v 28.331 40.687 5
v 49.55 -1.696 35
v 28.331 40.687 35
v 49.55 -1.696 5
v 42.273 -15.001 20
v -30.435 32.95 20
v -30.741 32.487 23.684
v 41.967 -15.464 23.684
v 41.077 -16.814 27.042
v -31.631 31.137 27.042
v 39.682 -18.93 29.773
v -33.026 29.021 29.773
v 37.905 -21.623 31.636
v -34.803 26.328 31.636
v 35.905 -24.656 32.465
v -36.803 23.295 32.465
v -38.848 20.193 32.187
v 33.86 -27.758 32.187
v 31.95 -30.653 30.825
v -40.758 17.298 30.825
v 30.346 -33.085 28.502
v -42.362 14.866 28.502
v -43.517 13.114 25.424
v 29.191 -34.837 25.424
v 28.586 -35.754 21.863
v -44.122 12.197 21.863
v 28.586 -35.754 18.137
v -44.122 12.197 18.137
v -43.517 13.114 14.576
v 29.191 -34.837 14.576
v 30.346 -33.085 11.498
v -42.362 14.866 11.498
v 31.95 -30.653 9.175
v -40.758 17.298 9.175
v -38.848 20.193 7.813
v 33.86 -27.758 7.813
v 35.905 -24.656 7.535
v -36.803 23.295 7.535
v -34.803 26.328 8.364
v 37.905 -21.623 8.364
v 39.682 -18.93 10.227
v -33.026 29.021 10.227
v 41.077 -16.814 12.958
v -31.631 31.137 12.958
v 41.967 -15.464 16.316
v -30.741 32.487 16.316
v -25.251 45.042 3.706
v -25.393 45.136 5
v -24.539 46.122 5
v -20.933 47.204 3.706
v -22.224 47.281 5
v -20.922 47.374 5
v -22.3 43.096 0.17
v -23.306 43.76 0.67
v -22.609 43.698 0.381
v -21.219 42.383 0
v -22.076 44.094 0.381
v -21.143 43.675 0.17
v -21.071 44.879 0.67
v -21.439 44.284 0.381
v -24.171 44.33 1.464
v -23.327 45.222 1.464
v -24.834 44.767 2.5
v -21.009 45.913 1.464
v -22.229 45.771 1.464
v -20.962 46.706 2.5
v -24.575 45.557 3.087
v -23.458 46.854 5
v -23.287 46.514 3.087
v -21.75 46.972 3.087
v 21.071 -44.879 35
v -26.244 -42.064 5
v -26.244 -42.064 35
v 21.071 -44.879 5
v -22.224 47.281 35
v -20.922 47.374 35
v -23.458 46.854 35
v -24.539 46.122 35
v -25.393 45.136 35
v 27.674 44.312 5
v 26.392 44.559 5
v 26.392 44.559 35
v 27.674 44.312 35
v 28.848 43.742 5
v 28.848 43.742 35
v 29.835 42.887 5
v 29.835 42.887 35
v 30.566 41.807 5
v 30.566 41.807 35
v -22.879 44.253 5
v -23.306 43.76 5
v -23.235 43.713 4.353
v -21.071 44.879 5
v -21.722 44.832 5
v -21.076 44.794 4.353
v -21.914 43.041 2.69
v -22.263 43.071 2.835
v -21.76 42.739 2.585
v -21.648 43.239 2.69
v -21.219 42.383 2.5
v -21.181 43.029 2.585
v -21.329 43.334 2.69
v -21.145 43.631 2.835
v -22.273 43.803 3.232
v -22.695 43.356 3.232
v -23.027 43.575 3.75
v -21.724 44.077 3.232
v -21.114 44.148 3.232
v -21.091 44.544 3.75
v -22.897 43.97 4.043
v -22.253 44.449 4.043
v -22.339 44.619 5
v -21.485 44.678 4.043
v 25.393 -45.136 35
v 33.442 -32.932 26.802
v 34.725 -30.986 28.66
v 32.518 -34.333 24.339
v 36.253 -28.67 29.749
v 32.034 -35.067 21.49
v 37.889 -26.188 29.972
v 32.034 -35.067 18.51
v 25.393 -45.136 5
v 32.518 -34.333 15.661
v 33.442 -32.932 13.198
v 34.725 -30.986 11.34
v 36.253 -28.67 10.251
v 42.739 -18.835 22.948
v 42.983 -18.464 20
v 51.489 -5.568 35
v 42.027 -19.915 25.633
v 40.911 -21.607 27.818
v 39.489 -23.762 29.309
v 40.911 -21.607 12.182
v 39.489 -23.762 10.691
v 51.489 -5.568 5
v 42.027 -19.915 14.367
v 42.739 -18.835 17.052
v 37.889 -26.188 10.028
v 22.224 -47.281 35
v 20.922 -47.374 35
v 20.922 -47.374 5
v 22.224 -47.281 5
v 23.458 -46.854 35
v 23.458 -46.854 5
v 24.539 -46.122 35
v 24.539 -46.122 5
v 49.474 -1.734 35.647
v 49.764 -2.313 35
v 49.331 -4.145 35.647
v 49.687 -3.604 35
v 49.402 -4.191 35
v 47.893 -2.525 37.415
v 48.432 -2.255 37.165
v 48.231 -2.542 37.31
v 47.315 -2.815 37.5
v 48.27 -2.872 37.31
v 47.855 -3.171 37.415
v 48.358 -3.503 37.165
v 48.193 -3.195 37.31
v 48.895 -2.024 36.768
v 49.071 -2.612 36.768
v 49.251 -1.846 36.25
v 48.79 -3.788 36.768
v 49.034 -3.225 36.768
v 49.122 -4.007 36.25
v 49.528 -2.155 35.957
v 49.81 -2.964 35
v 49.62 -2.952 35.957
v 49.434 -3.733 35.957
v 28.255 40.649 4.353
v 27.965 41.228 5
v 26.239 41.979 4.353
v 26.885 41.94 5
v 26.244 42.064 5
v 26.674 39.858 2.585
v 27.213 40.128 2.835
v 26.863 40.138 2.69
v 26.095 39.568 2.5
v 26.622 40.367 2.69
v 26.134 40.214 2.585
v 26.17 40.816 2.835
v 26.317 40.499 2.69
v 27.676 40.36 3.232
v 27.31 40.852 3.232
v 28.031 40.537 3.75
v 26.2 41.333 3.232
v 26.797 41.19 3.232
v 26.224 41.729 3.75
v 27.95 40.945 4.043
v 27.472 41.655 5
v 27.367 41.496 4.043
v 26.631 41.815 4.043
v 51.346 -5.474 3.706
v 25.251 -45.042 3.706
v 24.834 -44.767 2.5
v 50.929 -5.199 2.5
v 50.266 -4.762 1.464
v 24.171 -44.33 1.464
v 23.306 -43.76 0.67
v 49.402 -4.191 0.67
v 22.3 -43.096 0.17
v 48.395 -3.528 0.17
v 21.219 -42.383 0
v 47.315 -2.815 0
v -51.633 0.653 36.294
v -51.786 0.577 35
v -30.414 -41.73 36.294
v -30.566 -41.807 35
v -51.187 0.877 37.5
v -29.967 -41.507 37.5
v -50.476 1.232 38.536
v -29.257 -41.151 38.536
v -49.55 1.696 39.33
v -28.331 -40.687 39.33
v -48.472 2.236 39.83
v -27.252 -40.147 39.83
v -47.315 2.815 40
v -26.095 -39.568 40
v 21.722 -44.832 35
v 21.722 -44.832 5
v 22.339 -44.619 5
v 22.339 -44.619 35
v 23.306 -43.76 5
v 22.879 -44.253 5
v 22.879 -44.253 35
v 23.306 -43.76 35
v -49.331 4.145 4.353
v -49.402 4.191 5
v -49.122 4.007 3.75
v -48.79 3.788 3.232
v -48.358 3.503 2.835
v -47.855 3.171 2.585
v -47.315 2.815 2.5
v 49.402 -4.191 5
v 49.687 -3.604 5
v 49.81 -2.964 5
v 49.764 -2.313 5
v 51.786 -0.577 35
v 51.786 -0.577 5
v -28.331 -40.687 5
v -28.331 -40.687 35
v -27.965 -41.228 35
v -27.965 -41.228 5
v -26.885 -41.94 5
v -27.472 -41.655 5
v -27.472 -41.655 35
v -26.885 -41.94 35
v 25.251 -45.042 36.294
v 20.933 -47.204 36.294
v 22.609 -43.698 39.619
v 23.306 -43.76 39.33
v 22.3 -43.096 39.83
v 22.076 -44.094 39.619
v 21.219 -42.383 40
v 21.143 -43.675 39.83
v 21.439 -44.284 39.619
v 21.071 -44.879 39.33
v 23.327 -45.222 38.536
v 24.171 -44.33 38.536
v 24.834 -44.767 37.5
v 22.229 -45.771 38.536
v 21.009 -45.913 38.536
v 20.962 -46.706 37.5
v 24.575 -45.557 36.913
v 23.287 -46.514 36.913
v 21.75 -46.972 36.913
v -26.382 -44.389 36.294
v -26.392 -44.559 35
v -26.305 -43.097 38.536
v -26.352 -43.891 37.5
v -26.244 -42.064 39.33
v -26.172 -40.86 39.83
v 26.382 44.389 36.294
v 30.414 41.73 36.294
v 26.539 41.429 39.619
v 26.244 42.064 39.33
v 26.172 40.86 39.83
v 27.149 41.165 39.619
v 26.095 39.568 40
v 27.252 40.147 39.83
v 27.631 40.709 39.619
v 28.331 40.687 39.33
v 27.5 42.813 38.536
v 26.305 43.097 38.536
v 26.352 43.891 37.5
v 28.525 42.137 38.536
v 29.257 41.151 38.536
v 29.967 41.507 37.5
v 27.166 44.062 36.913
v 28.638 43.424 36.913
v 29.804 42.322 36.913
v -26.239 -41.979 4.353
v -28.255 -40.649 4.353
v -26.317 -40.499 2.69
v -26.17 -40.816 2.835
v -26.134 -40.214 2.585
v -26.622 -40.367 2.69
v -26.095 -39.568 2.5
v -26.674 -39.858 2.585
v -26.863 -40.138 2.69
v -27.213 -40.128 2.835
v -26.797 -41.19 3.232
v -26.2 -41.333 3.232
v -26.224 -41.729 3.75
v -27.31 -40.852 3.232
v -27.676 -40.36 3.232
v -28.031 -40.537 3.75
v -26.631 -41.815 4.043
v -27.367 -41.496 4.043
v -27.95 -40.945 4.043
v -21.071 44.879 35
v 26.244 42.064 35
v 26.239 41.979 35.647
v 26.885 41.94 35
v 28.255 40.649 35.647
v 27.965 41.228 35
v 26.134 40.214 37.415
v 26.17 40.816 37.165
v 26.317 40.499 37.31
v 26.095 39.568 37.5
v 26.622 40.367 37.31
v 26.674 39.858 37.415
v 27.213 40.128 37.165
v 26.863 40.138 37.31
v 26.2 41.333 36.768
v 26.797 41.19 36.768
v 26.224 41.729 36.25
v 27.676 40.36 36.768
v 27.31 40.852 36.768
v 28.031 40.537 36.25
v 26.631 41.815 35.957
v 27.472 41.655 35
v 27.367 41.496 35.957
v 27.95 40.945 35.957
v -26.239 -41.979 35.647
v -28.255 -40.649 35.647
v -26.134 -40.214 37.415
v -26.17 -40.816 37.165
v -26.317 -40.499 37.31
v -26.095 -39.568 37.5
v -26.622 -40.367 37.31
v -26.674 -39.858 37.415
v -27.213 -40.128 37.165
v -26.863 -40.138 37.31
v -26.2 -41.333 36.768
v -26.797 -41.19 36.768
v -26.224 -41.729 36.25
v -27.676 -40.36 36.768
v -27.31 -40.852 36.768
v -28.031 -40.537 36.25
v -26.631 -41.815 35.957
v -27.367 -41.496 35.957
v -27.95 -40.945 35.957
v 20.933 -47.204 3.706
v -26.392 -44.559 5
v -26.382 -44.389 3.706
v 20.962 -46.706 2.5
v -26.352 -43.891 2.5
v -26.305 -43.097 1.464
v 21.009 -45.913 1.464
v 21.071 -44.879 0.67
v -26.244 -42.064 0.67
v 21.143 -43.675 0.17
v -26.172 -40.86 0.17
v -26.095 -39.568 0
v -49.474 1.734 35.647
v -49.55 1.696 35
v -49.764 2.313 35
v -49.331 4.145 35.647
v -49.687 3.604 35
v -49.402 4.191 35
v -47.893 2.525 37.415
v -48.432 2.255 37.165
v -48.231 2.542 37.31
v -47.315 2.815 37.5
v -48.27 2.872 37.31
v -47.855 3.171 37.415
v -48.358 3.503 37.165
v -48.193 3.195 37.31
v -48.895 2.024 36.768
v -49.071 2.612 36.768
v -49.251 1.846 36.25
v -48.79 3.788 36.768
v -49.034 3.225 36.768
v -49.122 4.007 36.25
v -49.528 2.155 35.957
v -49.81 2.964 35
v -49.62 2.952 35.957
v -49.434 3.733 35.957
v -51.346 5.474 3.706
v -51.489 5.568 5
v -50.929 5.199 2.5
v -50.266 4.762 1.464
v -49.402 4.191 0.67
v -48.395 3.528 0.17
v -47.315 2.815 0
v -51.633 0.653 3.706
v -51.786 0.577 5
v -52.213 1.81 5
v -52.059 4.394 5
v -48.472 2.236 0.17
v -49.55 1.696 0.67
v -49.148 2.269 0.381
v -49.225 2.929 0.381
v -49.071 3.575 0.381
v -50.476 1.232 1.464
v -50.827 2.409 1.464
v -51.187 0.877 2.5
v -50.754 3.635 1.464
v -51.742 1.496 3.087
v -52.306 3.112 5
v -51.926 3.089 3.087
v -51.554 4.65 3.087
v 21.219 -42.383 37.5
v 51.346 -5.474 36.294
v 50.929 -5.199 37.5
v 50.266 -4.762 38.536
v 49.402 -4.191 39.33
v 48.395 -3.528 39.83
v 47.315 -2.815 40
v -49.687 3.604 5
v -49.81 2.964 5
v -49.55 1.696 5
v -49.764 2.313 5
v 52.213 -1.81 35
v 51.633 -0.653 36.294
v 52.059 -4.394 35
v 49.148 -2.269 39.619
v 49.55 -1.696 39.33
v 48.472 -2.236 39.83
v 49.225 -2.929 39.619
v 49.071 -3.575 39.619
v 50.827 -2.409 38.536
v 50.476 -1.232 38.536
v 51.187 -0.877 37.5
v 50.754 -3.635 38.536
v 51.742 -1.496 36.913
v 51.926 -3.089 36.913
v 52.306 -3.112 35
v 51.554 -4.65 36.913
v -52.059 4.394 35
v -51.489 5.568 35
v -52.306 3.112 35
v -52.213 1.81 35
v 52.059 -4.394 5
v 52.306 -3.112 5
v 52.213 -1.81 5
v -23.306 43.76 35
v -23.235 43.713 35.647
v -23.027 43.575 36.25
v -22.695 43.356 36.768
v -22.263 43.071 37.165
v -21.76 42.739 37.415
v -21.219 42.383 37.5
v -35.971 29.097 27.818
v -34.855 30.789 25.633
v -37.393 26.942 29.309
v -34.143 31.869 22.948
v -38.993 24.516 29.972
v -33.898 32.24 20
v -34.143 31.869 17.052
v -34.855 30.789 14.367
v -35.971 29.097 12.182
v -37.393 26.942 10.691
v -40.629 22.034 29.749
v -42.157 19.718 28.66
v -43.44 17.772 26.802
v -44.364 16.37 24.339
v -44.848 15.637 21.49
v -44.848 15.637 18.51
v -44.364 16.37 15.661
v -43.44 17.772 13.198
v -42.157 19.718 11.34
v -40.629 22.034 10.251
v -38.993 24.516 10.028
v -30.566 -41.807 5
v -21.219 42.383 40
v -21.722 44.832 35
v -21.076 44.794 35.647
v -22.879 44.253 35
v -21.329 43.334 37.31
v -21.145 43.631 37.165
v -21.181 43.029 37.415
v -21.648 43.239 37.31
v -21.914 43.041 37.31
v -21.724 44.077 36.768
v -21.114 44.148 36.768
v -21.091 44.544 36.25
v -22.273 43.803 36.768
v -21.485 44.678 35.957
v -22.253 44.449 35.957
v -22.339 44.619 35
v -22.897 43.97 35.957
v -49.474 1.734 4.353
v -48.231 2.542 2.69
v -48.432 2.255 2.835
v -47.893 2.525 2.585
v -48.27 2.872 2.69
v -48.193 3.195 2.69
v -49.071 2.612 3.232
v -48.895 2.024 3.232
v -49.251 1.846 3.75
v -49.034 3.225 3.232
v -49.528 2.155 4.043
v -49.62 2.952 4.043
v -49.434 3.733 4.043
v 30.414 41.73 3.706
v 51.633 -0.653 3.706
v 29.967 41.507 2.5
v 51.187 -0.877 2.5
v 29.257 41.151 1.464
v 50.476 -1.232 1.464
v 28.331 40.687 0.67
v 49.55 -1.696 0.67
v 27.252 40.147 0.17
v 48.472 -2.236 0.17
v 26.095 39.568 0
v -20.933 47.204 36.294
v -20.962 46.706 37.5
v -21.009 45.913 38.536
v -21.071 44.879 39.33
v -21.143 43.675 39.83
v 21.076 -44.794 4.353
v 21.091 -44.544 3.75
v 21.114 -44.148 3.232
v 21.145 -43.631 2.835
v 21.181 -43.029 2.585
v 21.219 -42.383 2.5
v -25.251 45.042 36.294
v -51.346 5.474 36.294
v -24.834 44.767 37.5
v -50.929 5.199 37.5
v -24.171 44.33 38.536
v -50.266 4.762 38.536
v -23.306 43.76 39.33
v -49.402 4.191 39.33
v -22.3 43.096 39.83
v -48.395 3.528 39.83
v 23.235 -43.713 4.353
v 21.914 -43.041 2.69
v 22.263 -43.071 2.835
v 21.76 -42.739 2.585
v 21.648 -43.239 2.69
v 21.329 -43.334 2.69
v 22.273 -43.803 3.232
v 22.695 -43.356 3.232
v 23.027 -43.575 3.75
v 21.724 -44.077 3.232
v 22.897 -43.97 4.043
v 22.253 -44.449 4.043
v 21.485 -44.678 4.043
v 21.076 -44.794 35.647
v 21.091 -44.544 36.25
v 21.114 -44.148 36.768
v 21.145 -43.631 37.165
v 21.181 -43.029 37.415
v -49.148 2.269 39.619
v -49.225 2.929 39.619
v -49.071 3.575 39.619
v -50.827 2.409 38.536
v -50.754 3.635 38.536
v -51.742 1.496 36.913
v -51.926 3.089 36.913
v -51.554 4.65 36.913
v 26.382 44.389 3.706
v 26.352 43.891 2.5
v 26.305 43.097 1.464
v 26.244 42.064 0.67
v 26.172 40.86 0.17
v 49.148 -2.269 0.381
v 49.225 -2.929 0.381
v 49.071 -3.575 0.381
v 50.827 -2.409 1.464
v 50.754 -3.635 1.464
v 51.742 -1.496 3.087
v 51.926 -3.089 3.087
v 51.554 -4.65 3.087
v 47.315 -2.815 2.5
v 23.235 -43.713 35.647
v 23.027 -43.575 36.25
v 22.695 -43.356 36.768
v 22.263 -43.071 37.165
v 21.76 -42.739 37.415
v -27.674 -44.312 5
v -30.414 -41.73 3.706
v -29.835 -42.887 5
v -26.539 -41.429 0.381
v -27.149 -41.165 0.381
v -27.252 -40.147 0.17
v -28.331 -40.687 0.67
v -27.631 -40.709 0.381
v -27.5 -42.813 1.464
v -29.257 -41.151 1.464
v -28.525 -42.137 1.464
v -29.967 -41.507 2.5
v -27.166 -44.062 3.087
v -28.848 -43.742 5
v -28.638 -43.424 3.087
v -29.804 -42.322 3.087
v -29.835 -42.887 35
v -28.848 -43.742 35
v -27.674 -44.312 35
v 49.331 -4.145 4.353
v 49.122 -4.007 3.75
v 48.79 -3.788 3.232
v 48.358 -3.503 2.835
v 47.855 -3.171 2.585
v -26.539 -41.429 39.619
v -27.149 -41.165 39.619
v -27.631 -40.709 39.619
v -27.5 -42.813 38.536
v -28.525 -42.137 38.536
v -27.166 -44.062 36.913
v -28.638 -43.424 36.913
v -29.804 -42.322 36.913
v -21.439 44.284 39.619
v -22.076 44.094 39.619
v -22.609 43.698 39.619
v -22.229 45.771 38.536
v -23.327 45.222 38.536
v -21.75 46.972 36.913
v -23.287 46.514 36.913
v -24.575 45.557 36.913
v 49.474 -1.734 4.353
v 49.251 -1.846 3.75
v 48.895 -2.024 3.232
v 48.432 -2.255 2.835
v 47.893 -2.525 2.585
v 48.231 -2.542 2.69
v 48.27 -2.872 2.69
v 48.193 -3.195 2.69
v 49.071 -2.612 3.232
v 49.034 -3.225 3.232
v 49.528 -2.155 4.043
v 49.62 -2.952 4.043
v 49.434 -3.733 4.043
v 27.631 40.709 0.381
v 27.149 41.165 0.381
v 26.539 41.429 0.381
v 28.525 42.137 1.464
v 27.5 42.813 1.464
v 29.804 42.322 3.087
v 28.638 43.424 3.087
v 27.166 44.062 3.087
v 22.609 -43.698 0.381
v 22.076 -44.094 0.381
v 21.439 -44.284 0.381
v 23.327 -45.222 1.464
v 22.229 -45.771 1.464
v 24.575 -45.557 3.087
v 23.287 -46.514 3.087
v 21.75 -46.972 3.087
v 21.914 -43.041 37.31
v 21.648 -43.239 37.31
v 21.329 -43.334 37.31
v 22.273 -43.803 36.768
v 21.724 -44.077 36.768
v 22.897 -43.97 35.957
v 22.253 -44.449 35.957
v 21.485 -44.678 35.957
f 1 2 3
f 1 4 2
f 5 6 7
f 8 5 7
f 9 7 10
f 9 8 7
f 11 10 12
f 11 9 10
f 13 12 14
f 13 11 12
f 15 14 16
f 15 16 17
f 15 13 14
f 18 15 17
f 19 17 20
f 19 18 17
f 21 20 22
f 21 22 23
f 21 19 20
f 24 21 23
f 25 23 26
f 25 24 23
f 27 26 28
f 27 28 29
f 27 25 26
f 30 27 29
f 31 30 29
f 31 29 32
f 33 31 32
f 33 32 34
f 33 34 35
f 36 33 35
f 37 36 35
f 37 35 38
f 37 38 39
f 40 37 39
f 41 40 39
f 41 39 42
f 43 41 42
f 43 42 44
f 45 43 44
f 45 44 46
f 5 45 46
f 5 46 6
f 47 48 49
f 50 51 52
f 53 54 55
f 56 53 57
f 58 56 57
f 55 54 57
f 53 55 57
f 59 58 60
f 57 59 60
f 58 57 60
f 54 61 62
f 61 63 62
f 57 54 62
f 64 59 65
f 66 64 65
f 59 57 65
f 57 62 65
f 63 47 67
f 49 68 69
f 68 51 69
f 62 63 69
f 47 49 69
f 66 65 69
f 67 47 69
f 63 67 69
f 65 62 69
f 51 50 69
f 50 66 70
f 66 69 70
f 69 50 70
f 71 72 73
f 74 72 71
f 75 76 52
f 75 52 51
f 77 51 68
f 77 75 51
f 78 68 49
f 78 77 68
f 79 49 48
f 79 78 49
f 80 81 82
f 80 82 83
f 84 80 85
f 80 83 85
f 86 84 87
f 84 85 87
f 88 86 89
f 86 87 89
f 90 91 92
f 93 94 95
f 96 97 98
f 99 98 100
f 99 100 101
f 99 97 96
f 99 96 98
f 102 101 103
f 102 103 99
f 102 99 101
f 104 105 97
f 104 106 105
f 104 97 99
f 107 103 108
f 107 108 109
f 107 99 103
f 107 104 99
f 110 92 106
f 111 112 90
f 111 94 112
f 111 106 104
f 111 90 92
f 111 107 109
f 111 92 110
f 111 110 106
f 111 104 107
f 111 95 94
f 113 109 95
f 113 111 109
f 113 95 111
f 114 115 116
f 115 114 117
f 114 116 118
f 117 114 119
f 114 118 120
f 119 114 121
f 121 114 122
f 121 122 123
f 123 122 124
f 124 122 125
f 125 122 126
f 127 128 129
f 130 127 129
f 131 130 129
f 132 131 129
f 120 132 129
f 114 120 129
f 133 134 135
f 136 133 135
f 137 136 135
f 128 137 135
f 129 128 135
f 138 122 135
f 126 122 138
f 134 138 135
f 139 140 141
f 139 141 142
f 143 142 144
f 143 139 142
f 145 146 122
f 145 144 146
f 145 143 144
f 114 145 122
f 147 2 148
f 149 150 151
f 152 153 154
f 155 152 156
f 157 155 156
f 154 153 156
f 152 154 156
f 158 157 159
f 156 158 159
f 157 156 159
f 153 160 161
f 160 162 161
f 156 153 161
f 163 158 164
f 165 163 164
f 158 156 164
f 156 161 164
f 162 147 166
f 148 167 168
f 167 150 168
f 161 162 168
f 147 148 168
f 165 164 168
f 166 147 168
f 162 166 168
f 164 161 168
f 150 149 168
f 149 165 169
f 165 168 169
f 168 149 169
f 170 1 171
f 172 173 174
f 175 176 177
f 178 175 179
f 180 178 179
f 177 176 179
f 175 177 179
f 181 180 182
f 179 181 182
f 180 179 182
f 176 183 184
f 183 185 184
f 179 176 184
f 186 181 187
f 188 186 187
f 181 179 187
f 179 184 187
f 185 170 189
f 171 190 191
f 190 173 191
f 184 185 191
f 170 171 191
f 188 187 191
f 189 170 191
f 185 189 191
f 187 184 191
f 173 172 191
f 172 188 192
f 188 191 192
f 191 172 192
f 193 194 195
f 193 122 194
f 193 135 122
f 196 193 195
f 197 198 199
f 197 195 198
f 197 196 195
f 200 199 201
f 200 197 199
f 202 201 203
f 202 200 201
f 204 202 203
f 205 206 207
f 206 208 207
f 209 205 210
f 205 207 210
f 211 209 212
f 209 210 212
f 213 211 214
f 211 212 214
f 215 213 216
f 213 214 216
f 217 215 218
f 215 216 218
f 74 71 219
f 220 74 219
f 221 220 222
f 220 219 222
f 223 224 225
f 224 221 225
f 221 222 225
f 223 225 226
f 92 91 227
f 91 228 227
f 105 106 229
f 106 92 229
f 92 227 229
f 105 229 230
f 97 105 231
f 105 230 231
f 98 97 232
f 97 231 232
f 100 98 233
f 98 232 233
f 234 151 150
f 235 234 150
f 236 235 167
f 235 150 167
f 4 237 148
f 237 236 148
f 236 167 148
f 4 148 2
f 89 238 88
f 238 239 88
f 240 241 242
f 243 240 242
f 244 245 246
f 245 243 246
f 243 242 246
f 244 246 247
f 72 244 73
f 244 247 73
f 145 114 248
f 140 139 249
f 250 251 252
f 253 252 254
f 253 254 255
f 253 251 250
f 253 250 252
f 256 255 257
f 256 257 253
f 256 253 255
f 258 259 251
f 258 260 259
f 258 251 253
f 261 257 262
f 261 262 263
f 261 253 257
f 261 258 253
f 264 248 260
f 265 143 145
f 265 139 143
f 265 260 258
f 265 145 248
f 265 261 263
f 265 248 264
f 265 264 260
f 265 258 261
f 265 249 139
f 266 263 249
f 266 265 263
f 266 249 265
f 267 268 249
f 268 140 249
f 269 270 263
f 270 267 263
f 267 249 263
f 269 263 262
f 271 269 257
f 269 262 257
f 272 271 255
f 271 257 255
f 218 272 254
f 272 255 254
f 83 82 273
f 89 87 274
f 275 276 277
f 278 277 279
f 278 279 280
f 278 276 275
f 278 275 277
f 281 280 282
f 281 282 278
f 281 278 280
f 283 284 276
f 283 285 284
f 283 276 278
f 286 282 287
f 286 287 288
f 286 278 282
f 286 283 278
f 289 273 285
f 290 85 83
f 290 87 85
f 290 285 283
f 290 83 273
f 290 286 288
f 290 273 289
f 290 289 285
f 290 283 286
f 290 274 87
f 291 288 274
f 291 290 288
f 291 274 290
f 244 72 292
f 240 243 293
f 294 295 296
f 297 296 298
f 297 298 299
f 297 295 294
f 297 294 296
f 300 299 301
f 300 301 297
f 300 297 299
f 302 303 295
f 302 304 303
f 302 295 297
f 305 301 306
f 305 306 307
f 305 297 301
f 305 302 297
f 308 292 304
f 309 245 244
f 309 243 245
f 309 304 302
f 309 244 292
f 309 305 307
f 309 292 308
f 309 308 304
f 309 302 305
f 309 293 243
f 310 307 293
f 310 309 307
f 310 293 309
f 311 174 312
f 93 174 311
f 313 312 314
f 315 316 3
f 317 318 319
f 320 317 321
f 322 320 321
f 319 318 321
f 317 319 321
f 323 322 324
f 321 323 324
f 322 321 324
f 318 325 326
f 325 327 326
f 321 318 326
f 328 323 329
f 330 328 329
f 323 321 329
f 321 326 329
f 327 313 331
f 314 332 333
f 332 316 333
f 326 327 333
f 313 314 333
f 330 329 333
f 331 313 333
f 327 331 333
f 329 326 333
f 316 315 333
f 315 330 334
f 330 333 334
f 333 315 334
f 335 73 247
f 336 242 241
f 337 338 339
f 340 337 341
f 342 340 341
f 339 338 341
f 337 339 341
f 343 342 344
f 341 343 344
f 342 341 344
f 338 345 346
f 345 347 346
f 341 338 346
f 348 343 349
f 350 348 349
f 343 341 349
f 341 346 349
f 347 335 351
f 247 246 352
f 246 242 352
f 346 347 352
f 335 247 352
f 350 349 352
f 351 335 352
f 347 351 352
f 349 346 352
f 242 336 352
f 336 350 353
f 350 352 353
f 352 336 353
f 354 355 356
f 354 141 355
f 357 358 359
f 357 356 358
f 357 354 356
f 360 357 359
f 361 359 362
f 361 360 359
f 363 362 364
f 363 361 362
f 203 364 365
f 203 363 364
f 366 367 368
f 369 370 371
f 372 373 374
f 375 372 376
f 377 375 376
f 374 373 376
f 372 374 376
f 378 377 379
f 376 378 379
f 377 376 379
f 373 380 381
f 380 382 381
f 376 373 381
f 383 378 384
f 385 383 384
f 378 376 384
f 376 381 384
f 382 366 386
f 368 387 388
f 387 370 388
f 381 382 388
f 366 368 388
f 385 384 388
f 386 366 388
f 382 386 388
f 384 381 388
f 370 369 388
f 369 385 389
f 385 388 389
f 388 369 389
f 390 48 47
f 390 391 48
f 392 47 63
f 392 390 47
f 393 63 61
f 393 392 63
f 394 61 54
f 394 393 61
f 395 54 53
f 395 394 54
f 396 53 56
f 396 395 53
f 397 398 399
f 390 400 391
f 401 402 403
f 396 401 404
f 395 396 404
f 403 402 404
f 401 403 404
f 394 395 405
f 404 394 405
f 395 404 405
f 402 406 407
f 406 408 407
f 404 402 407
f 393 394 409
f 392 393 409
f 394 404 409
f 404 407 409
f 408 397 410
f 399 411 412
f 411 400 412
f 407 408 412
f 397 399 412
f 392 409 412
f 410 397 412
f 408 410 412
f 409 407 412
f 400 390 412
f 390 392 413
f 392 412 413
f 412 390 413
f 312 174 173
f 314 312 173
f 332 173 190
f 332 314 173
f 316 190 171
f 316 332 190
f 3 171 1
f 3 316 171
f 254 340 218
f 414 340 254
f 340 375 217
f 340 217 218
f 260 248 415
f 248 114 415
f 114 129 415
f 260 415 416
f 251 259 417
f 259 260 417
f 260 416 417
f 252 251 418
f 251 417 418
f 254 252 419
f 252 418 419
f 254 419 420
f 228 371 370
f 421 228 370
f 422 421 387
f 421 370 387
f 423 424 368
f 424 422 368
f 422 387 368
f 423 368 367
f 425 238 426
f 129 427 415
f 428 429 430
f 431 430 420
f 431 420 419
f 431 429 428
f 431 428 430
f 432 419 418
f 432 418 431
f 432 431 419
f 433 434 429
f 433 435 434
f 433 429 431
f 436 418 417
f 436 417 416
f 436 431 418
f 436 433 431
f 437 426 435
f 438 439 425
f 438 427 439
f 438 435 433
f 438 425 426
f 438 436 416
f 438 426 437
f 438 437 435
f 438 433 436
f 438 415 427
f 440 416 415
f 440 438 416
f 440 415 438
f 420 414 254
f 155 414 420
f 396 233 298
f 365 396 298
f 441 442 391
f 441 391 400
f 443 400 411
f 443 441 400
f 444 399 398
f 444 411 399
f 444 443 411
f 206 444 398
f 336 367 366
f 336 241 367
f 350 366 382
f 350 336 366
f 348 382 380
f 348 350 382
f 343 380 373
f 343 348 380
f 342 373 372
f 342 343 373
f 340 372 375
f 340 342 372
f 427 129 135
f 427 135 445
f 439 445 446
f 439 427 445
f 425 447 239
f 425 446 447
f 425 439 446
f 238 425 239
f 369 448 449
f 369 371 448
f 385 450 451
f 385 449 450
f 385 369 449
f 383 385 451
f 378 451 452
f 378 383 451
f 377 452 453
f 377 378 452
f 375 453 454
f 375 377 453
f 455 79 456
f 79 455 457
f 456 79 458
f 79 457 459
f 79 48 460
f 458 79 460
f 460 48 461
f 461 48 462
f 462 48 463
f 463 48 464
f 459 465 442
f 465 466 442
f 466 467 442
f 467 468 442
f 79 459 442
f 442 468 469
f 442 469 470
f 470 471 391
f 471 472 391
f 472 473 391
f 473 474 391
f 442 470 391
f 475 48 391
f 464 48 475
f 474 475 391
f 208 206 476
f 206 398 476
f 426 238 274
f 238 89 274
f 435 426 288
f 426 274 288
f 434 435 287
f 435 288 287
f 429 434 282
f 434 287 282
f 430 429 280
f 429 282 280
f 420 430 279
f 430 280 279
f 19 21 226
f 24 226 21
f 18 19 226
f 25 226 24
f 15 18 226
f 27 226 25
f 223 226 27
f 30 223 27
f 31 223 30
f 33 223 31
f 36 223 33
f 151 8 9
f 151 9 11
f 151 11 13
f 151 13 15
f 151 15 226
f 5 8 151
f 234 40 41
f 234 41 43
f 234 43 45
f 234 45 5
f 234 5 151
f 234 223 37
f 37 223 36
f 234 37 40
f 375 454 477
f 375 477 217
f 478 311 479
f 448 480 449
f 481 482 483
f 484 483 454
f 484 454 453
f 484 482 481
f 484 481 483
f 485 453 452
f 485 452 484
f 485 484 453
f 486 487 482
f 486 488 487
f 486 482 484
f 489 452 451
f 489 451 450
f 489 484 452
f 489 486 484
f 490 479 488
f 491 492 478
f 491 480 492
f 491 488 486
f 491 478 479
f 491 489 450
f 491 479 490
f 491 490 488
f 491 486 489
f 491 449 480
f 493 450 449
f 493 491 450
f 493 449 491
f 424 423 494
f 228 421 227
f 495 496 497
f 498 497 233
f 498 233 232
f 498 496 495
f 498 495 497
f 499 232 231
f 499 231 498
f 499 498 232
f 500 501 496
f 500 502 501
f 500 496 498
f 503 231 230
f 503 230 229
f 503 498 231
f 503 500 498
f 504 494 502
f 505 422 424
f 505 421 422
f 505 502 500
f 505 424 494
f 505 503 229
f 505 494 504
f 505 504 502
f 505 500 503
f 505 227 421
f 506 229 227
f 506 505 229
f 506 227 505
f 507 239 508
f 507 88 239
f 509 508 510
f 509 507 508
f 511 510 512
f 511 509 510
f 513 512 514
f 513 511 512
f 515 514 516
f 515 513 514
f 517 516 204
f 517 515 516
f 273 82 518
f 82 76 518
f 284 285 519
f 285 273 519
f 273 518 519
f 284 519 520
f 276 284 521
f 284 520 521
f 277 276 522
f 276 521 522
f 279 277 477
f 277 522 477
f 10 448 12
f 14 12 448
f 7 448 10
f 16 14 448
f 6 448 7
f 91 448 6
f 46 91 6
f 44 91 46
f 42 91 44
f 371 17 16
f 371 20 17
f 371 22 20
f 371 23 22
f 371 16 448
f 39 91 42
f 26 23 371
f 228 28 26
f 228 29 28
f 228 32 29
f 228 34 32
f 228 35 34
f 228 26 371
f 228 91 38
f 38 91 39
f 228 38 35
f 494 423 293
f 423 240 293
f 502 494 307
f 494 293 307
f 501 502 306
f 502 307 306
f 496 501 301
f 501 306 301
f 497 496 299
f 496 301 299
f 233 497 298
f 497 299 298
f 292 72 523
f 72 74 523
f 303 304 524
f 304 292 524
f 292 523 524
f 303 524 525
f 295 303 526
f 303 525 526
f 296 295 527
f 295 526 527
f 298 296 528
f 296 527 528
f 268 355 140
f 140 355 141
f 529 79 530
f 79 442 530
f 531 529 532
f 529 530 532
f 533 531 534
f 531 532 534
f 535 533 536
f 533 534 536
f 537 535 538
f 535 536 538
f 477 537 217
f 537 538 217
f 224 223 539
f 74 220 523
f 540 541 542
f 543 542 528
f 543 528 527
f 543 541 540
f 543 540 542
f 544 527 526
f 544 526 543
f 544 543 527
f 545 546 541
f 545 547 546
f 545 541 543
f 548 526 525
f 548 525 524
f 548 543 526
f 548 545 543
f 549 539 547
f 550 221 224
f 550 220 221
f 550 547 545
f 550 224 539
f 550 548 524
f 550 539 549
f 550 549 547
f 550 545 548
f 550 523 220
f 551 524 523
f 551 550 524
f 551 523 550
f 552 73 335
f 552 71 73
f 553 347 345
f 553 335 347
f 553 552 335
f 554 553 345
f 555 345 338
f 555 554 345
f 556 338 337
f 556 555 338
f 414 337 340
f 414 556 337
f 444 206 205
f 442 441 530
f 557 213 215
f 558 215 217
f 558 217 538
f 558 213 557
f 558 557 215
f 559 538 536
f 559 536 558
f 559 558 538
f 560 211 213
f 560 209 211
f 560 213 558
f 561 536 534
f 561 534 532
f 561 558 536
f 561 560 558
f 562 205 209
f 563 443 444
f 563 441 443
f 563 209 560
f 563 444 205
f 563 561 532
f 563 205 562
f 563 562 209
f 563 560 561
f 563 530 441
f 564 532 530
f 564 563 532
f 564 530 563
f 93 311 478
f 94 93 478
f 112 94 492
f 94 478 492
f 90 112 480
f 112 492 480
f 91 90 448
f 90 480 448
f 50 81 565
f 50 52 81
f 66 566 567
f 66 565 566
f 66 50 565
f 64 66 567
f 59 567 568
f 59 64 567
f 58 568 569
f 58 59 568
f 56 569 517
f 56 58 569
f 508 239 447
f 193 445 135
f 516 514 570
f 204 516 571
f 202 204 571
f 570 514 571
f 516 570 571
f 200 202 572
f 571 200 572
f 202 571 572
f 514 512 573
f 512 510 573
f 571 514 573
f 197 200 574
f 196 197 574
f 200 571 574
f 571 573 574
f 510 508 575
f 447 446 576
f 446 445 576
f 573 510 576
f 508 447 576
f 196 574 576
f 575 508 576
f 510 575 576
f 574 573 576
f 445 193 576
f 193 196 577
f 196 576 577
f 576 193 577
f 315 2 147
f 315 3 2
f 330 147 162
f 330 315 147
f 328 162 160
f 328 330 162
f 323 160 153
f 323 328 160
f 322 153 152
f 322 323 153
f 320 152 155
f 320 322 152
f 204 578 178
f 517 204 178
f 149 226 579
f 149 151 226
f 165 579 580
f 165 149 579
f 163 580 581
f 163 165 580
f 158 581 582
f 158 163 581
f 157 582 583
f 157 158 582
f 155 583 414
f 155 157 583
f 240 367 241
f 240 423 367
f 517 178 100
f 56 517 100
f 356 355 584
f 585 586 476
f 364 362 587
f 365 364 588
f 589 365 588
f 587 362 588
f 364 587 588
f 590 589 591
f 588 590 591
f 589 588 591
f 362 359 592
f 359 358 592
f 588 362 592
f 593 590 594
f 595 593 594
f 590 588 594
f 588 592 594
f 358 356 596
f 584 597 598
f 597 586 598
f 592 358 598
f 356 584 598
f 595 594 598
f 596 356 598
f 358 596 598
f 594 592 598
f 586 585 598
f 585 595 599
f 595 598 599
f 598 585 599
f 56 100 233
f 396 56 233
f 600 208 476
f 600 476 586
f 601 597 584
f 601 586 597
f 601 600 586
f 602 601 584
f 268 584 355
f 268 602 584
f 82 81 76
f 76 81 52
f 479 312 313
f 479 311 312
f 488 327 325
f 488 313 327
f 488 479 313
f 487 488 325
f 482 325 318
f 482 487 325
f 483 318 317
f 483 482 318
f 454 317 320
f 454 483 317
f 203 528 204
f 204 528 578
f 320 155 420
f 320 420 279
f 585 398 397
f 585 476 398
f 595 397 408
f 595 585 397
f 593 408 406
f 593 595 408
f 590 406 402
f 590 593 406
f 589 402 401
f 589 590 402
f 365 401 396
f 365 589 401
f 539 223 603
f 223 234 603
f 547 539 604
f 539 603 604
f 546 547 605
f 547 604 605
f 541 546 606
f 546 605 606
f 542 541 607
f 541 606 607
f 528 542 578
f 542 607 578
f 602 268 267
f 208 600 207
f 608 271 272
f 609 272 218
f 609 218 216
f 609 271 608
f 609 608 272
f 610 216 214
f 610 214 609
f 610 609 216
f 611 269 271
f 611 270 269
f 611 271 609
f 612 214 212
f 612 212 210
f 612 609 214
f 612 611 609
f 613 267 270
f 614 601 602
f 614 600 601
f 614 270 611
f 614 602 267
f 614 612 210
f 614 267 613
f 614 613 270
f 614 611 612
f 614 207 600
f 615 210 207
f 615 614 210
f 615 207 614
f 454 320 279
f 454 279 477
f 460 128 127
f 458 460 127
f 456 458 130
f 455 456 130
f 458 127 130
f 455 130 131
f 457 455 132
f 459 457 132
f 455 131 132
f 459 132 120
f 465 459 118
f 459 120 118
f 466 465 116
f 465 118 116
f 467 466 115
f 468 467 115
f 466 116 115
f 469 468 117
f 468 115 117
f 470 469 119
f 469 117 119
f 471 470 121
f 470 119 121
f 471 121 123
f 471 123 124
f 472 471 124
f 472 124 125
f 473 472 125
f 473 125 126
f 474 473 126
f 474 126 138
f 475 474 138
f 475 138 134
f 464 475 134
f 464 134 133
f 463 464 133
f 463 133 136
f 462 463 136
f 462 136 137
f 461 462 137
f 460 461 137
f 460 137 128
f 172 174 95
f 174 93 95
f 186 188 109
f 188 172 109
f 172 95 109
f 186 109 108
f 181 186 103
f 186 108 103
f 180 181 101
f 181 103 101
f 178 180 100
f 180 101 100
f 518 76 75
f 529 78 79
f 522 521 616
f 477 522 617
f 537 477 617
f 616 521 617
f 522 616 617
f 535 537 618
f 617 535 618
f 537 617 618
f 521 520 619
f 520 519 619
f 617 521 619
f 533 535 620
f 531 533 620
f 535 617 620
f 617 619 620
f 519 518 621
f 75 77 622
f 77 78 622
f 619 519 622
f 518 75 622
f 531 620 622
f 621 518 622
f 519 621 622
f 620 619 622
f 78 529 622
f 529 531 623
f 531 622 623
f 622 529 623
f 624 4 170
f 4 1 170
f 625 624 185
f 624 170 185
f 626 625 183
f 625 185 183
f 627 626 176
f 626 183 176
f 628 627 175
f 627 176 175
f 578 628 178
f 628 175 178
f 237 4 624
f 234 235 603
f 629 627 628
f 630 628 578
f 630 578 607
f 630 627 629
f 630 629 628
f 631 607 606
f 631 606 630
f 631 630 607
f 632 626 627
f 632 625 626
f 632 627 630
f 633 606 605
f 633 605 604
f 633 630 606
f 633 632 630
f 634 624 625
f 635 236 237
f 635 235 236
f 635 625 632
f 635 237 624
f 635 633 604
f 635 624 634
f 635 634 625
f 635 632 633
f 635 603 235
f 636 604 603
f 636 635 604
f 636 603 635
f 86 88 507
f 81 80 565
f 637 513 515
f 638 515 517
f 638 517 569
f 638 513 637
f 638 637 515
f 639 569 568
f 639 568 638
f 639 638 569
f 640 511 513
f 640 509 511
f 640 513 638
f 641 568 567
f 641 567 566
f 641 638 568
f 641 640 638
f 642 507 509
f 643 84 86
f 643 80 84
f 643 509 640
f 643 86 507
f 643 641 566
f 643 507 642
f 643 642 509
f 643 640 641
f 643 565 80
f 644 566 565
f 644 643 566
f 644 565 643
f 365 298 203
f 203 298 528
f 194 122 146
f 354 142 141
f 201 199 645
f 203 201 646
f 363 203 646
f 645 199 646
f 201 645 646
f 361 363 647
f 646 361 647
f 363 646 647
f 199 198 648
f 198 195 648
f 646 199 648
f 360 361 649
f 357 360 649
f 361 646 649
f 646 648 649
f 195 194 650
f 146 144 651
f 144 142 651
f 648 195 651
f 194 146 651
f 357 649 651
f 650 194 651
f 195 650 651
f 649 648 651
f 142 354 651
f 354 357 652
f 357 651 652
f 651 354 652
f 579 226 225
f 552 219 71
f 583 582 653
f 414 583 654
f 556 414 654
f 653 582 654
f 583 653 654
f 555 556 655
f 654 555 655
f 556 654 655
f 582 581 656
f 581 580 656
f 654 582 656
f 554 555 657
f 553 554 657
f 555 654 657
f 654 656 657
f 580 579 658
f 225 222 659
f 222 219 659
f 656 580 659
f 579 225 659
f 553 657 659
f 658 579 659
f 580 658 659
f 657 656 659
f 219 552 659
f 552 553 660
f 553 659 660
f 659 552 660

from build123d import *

# Parameters (mm, degrees)
F1_DEPTH       = 40
F2_R           = 5
F4_D           = 20
F4_CBORE_D     = 20
F4_CBORE_DEPTH = 20
F5_T           = -2.5


# Not quite as in the source:
# - a shell that OpenCascade refuses in one call is made with other operations: the cavity is built on its own and cut out


with BuildPart() as f1:
    # F0 (on Top) → F1 (new body)
    with BuildSketch(Plane.XY):
        Polygon((29.2738805136, 44.3878389125), (-23.8040558605, 47.5458436484), (-53.0779363741, 3.1580047359), (-29.2738805136, -44.3878389125), (23.8040558605, -47.5458436484), (53.0779363741, -3.1580047359), align=None)
    extrude(amount=F1_DEPTH)

    # F2
    f2_edges = [f1.edges().sort_by_distance(p)[0] for p in [
        (2.734912, 45.966841, 40),
        (41.175908, 20.614917, 40),
        (38.440996, -25.351924, 40),
        (-2.734912, -45.966841, 40),
        (-41.175908, -20.614917, 40),
        (-38.440996, 25.351924, 40),
        (29.273881, 44.387839, 20),
        (-23.804056, 47.545844, 20),
        (-53.077936, 3.158005, 20),
        (-29.273881, -44.387839, 20),
        (23.804056, -47.545844, 20),
        (53.077936, -3.158005, 20),
        (41.175908, 20.614917, 0),
        (38.440996, -25.351924, 0),
        (-2.734912, -45.966841, 0),
        (-41.175908, -20.614917, 0),
        (-38.440996, 25.351924, 0),
        (2.734912, 45.966841, 0),
    ]]
    fillet(f2_edges, radius=F2_R)

    # F4 (through all)
    with Locations(Plane(origin=(-38.4409961173, 25.3519241922, 0), x_dir=(-0.5505527454, -0.83480038, 0), z_dir=(-0.83480038, 0.5505527454, 0))):
        with Locations((1.7491957406, 20)):
            CounterBoreHole(F4_D / 2, F4_CBORE_D / 2, F4_CBORE_DEPTH)

    # F5: a shell. OpenCascade refuses it in one call, so the cavity is built on its own and cut out:
    # the body offset inwards by the wall thickness, plus a prism from it out through each open face.
    f5_core = offset(f1.part, amount=F5_T, mode=Mode.PRIVATE)
    f5_exits = [f5_core.faces().sort_by_distance(p)[0] for p in [
        (0, 0, 2.5),
        (0, 0, 37.5),
    ]]
    add(f5_core, mode=Mode.SUBTRACT)
    extrude(f5_exits, amount=-F5_T, mode=Mode.SUBTRACT)


solid = f1.part
